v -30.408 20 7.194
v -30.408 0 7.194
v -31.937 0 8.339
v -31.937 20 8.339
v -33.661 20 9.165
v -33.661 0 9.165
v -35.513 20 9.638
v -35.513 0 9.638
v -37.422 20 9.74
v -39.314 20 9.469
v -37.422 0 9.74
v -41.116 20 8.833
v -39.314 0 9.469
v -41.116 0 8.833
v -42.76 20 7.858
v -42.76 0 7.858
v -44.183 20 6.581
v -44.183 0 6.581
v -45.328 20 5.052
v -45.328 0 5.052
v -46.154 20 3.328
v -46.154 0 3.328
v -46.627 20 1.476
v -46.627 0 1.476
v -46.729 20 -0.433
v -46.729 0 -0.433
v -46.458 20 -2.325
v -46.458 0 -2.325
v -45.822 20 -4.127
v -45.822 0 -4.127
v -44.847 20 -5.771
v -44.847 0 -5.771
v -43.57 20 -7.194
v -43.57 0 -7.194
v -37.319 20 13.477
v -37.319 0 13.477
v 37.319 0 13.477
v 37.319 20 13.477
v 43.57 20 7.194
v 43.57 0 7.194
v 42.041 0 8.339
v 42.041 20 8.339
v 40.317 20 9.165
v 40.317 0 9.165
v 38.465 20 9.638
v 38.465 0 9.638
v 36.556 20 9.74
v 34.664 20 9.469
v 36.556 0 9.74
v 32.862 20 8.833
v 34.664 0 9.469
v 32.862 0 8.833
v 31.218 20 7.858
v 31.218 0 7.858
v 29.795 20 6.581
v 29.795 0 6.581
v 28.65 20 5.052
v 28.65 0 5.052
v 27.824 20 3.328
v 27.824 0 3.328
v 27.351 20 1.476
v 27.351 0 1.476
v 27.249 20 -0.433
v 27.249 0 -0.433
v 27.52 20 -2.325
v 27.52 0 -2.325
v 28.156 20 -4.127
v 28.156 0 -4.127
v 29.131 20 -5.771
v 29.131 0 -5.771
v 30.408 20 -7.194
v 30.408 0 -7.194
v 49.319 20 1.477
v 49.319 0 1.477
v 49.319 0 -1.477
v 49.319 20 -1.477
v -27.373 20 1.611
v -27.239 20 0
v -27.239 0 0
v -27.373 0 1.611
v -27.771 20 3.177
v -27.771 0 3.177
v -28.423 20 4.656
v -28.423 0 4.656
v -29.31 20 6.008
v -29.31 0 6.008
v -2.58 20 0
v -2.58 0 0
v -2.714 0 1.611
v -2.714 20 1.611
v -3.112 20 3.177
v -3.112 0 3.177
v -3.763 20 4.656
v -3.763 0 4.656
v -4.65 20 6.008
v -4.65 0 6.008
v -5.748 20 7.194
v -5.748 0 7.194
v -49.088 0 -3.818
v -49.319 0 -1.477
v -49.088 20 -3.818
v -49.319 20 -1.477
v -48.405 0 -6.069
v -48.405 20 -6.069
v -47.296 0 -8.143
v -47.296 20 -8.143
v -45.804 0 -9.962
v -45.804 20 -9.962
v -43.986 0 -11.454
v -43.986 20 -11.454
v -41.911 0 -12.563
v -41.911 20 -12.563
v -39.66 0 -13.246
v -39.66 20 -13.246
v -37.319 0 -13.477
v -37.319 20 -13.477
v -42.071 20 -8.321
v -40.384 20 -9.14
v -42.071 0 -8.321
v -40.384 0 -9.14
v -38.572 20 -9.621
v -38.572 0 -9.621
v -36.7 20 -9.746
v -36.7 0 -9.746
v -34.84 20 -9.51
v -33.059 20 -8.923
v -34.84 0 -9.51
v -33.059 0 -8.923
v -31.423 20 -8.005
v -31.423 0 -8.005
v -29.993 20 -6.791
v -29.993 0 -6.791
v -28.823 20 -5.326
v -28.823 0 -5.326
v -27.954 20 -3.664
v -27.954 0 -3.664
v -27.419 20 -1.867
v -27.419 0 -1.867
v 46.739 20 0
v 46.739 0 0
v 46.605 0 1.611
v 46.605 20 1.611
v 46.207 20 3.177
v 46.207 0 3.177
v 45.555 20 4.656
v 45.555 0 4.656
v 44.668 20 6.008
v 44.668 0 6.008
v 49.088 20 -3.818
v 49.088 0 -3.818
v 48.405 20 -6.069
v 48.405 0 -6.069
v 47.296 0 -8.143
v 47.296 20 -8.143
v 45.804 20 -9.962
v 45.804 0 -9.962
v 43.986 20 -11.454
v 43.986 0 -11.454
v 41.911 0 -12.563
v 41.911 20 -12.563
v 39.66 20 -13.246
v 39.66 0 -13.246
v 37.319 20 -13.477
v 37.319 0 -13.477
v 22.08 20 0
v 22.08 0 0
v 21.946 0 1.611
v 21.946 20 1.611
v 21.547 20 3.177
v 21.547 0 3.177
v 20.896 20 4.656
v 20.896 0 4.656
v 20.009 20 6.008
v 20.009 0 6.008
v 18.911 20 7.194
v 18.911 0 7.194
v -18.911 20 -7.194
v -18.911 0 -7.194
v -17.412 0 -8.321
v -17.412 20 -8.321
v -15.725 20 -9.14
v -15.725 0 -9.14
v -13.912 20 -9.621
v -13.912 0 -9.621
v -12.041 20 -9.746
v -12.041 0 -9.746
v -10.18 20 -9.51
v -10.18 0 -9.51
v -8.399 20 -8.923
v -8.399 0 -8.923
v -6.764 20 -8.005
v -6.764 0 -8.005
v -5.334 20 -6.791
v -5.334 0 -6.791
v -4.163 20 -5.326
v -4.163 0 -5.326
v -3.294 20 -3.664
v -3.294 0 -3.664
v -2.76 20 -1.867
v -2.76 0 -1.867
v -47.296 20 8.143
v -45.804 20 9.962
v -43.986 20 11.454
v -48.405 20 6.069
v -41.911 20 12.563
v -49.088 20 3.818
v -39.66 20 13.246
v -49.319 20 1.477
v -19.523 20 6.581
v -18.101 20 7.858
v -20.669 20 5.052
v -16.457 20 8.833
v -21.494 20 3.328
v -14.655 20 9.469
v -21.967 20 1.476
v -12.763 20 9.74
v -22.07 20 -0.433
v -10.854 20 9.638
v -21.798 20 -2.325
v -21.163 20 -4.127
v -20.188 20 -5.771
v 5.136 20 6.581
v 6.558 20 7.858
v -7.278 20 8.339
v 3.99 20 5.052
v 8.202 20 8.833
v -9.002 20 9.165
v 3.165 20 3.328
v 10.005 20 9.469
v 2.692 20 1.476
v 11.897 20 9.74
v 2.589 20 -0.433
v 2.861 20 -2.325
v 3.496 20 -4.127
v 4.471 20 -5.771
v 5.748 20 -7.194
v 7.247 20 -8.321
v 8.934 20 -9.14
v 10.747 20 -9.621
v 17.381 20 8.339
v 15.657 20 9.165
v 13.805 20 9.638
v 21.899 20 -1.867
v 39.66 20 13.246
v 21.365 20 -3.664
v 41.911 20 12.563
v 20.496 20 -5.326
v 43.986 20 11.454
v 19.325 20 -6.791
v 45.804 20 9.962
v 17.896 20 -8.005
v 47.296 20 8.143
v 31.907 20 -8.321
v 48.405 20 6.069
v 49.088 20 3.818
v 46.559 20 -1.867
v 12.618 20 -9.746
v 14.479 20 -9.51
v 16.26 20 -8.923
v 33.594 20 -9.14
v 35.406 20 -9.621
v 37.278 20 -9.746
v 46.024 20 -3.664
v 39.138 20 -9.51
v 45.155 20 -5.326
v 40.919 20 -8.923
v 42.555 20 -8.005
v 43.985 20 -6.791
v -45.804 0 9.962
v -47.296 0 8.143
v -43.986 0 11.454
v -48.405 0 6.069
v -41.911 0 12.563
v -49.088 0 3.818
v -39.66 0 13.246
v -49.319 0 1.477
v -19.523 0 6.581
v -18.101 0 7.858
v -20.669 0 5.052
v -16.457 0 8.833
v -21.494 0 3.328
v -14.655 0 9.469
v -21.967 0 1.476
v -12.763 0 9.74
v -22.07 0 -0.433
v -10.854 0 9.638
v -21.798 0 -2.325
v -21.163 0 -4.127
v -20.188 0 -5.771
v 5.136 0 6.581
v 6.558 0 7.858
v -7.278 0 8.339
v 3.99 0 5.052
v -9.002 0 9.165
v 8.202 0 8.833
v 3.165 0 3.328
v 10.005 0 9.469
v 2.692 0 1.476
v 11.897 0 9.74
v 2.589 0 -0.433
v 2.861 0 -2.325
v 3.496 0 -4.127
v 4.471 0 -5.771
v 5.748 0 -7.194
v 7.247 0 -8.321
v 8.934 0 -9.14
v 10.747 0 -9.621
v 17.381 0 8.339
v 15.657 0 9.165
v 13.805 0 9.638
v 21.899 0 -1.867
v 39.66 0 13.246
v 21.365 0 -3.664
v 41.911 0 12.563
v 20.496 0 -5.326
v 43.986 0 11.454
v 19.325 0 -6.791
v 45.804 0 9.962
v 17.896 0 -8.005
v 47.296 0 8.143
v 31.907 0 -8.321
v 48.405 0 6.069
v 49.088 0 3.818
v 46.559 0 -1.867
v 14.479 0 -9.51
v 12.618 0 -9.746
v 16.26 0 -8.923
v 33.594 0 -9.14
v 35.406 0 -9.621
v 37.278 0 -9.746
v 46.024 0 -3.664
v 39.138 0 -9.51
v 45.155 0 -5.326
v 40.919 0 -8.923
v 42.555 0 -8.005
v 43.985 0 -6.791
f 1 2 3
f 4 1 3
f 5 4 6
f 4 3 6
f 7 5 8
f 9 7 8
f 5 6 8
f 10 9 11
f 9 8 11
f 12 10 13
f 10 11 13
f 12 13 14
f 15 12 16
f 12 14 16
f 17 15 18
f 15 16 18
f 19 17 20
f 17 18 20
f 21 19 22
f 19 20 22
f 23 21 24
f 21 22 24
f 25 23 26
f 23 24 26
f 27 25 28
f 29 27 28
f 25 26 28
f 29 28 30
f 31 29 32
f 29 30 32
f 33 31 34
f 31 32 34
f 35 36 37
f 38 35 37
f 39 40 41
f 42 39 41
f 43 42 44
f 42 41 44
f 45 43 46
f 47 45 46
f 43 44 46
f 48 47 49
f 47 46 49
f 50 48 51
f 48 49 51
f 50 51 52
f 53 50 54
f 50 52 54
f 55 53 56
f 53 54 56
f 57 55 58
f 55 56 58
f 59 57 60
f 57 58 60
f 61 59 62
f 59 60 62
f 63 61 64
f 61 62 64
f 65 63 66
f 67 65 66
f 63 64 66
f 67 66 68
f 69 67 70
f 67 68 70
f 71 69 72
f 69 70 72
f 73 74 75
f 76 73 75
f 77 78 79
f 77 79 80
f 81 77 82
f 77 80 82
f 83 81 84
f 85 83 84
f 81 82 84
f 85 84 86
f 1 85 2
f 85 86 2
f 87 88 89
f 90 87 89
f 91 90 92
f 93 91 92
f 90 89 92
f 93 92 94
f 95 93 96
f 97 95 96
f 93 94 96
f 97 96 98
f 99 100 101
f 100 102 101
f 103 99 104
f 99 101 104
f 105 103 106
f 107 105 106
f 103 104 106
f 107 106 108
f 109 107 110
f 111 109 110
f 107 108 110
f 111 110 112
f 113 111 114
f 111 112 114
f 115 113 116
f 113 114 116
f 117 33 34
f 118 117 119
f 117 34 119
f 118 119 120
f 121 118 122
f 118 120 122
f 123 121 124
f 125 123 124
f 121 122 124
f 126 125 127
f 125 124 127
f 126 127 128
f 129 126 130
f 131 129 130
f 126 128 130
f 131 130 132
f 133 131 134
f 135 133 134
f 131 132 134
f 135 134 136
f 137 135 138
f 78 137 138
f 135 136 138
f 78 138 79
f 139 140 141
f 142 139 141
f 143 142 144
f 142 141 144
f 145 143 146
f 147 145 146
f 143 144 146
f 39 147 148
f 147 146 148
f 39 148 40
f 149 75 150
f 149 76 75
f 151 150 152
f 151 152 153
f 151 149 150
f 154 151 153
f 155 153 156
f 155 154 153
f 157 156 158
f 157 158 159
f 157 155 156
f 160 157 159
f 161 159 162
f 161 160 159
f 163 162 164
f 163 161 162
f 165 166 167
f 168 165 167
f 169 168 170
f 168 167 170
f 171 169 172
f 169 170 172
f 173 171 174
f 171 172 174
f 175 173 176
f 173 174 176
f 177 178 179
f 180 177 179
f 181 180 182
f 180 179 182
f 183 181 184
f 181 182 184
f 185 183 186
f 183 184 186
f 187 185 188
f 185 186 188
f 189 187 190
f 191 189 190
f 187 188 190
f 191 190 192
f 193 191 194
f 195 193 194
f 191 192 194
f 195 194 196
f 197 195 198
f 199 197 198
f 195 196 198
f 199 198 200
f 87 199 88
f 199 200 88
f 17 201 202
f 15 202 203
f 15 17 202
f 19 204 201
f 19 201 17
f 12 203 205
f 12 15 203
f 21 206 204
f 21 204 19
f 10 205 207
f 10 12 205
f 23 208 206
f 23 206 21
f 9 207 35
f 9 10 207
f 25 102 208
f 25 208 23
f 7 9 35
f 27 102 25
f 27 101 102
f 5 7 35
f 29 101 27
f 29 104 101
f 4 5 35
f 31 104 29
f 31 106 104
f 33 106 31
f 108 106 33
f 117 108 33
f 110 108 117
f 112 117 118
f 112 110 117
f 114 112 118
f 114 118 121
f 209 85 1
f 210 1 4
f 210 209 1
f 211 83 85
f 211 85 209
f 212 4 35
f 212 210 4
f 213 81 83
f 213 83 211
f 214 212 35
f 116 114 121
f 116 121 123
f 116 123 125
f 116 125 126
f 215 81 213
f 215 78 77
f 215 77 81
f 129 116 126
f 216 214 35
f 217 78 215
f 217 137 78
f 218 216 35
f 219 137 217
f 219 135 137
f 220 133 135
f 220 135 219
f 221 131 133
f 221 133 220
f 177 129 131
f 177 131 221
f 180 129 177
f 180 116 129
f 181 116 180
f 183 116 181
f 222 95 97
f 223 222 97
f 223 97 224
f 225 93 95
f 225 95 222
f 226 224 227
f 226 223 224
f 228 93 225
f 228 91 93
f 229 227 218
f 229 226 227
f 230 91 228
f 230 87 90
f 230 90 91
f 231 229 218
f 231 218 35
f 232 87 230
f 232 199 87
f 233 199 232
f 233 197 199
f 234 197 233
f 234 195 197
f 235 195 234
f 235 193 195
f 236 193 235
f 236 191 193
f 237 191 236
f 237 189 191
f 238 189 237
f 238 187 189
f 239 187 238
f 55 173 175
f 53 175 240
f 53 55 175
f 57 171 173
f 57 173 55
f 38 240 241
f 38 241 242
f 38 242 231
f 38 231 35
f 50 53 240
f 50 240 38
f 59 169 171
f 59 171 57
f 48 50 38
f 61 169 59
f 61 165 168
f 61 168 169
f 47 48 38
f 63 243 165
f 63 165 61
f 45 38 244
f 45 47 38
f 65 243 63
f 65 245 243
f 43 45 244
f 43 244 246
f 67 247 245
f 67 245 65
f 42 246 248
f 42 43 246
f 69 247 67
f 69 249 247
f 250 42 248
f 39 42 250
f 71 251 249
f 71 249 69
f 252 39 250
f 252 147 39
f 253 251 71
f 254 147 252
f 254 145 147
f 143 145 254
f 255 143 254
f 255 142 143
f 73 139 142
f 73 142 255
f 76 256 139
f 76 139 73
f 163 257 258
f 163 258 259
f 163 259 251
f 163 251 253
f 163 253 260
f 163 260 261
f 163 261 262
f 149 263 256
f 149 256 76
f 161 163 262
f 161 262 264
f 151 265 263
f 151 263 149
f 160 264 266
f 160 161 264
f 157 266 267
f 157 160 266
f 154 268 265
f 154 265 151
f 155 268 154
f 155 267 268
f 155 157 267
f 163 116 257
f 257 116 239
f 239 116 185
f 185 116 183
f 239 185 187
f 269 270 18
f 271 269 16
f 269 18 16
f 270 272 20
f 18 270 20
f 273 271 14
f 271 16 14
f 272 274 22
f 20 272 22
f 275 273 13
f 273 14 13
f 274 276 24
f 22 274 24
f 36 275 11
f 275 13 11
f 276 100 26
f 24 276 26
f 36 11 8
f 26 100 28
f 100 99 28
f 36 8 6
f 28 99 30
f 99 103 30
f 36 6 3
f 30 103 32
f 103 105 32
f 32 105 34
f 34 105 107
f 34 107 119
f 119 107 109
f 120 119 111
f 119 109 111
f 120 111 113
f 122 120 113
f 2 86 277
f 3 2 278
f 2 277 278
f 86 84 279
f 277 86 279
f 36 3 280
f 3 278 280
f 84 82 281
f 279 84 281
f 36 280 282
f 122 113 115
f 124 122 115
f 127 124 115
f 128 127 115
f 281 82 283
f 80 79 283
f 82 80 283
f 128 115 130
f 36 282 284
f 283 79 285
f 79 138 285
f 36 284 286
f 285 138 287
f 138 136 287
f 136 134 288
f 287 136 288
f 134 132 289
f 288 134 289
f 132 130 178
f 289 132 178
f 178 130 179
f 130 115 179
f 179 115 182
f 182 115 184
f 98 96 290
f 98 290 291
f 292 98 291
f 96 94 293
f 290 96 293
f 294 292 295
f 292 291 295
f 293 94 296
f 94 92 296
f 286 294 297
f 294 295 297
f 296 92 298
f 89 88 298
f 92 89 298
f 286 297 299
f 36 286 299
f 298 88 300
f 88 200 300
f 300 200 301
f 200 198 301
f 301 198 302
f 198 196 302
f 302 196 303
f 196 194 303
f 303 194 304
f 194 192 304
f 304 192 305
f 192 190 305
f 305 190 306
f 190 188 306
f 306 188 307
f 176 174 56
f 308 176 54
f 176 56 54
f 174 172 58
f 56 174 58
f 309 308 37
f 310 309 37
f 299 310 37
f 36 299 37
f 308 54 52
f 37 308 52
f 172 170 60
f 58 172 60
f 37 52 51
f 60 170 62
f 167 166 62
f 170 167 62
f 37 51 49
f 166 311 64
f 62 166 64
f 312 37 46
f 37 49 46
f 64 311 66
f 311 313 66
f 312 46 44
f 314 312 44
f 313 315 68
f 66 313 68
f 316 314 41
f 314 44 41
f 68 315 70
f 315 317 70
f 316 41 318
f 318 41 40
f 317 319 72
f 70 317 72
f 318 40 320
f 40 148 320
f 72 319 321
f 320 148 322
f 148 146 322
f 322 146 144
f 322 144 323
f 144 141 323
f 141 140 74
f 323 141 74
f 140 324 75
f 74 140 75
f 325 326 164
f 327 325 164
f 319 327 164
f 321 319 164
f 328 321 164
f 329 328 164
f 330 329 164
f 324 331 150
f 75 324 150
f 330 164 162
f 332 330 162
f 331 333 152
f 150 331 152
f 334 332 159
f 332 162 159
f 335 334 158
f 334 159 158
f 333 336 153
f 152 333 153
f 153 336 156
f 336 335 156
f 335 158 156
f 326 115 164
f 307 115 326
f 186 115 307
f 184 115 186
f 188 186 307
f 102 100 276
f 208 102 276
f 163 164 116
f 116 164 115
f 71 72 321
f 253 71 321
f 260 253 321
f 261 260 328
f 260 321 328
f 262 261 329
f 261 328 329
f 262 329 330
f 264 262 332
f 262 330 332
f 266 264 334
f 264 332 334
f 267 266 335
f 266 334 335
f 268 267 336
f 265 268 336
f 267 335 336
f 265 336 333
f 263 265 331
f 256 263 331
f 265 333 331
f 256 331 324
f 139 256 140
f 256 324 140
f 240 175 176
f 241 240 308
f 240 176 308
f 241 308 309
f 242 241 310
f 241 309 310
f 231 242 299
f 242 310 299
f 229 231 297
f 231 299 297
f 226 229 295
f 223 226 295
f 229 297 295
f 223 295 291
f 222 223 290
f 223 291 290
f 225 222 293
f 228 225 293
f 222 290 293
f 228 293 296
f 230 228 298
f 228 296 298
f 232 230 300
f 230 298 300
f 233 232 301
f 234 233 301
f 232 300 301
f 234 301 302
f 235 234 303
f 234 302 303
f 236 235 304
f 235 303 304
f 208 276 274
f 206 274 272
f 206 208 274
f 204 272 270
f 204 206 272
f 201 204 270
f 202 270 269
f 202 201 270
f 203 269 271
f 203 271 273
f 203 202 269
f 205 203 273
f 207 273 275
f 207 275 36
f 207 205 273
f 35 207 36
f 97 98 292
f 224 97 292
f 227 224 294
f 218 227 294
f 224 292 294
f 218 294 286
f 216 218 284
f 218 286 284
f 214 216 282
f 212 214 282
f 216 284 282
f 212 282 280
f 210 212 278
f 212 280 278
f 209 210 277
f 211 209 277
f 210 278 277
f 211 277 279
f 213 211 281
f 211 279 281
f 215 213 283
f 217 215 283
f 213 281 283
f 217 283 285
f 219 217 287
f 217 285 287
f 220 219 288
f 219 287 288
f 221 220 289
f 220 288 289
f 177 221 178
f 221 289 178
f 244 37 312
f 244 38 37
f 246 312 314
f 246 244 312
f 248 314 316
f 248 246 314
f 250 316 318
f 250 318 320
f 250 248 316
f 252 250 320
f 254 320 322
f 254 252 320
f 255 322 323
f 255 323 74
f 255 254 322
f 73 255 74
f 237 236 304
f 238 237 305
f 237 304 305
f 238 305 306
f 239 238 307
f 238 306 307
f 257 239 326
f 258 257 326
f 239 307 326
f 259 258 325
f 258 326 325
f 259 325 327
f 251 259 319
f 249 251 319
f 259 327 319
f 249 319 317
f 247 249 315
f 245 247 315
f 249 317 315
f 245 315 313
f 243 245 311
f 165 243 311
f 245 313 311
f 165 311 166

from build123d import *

# Parameters (mm, degrees)
BOSS_EXTRUDE1_DEPTH = 20
FILLET2_R           = 12


with BuildPart() as part:
    # Sketch1 → Boss-Extrude1 (new body)
    with BuildSketch(Plane(origin=(0, 0, 0), x_dir=(1, 0, 0), z_dir=(0, 1, 0))):
        with BuildLine():
            Line((-24.659328932, -13.476609998), (-24.659328932, 13.476609998))
            Line((-24.659328932, 13.476609998), (-49.318657865, 13.476609998))
            Line((-49.318657865, 13.476609998), (-43.570374654, 7.193602767))
            ThreePointArc((-43.570374654, 7.193602767), (-33.058724148, 8.9227509), (-27.238993399, 0))
            ThreePointArc((-27.238993399, 0), (-28.066242499, -3.93026925), (-30.407612143, -7.193602767))
            Line((-30.407612143, -7.193602767), (-24.659328932, -13.476609998))
        make_face()
        with BuildLine():
            Line((-49.318657865, -13.476609998), (-24.659328932, -13.476609998))
            Line((-24.659328932, -13.476609998), (-30.407612143, -7.193602767))
            ThreePointArc((-30.407612143, -7.193602767), (-44.182596166, -6.581381255), (-43.570374654, 7.193602767))
            Line((-43.570374654, 7.193602767), (-49.318657865, 13.476609998))
            Line((-49.318657865, 13.476609998), (-49.318657865, -13.476609998))
        make_face()
        with BuildLine():
            Line((0, -13.476609998), (0, 13.476609998))
            Line((0, 13.476609998), (-24.659328932, 13.476609998))
            Line((-24.659328932, 13.476609998), (-18.911045721, 7.193602767))
            ThreePointArc((-18.911045721, 7.193602767), (-8.399395216, 8.9227509), (-2.579664466, 0))
            ThreePointArc((-2.579664466, 0), (-3.406913566, -3.93026925), (-5.748283211, -7.193602767))
            Line((-5.748283211, -7.193602767), (0, -13.476609998))
        make_face()
        with BuildLine():
            Line((-24.659328932, -13.476609998), (0, -13.476609998))
            Line((0, -13.476609998), (-5.748283211, -7.193602767))
            ThreePointArc((-5.748283211, -7.193602767), (-19.523267233, -6.581381255), (-18.911045721, 7.193602767))
            Line((-18.911045721, 7.193602767), (-24.659328932, 13.476609998))
            Line((-24.659328932, 13.476609998), (-24.659328932, -13.476609998))
        make_face()
        with BuildLine():
            Line((24.659328932, 13.476609998), (0, 13.476609998))
            Line((0, 13.476609998), (5.748283211, 7.193602767))
            ThreePointArc((5.748283211, 7.193602767), (16.259933717, 8.9227509), (22.079664466, 0))
            ThreePointArc((22.079664466, 0), (21.252415366, -3.93026925), (18.911045721, -7.193602767))
            Line((18.911045721, -7.193602767), (24.659328932, -13.476609998))
            Line((24.659328932, -13.476609998), (24.659328932, 13.476609998))
        make_face()
        with BuildLine():
            Line((5.748283211, 7.193602767), (0, 13.476609998))
            Line((0, 13.476609998), (0, -13.476609998))
            Line((0, -13.476609998), (24.659328932, -13.476609998))
            Line((24.659328932, -13.476609998), (18.911045721, -7.193602767))
            ThreePointArc((18.911045721, -7.193602767), (5.136061699, -6.581381255), (5.748283211, 7.193602767))
        make_face()
        with BuildLine():
            Line((49.318657865, 13.476609998), (24.659328932, 13.476609998))
            Line((24.659328932, 13.476609998), (30.407612143, 7.193602767))
            ThreePointArc((30.407612143, 7.193602767), (40.919262649, 8.9227509), (46.738993399, 0))
            ThreePointArc((46.738993399, 0), (45.911744298, -3.93026925), (43.570374654, -7.193602767))
            Line((43.570374654, -7.193602767), (49.318657865, -13.476609998))
            Line((49.318657865, -13.476609998), (49.318657865, 13.476609998))
        make_face()
        with BuildLine():
            Line((30.407612143, 7.193602767), (24.659328932, 13.476609998))
            Line((24.659328932, 13.476609998), (24.659328932, -13.476609998))
            Line((24.659328932, -13.476609998), (49.318657865, -13.476609998))
            Line((49.318657865, -13.476609998), (43.570374654, -7.193602767))
            ThreePointArc((43.570374654, -7.193602767), (29.795390631, -6.581381255), (30.407612143, 7.193602767))
        make_face()
    extrude(amount=BOSS_EXTRUDE1_DEPTH)

    # Fillet2
    fillet2_edges = [part.edges().sort_by_distance(p)[0] for p in [
        (-49.318657865, 10, 13.476609998),
        (-49.318657865, 10, -13.476609998),
        (49.318657865, 10, -13.476609998),
        (49.318657865, 10, 13.476609998),
    ]]
    fillet(fillet2_edges, radius=FILLET2_R)


solid = part.part
